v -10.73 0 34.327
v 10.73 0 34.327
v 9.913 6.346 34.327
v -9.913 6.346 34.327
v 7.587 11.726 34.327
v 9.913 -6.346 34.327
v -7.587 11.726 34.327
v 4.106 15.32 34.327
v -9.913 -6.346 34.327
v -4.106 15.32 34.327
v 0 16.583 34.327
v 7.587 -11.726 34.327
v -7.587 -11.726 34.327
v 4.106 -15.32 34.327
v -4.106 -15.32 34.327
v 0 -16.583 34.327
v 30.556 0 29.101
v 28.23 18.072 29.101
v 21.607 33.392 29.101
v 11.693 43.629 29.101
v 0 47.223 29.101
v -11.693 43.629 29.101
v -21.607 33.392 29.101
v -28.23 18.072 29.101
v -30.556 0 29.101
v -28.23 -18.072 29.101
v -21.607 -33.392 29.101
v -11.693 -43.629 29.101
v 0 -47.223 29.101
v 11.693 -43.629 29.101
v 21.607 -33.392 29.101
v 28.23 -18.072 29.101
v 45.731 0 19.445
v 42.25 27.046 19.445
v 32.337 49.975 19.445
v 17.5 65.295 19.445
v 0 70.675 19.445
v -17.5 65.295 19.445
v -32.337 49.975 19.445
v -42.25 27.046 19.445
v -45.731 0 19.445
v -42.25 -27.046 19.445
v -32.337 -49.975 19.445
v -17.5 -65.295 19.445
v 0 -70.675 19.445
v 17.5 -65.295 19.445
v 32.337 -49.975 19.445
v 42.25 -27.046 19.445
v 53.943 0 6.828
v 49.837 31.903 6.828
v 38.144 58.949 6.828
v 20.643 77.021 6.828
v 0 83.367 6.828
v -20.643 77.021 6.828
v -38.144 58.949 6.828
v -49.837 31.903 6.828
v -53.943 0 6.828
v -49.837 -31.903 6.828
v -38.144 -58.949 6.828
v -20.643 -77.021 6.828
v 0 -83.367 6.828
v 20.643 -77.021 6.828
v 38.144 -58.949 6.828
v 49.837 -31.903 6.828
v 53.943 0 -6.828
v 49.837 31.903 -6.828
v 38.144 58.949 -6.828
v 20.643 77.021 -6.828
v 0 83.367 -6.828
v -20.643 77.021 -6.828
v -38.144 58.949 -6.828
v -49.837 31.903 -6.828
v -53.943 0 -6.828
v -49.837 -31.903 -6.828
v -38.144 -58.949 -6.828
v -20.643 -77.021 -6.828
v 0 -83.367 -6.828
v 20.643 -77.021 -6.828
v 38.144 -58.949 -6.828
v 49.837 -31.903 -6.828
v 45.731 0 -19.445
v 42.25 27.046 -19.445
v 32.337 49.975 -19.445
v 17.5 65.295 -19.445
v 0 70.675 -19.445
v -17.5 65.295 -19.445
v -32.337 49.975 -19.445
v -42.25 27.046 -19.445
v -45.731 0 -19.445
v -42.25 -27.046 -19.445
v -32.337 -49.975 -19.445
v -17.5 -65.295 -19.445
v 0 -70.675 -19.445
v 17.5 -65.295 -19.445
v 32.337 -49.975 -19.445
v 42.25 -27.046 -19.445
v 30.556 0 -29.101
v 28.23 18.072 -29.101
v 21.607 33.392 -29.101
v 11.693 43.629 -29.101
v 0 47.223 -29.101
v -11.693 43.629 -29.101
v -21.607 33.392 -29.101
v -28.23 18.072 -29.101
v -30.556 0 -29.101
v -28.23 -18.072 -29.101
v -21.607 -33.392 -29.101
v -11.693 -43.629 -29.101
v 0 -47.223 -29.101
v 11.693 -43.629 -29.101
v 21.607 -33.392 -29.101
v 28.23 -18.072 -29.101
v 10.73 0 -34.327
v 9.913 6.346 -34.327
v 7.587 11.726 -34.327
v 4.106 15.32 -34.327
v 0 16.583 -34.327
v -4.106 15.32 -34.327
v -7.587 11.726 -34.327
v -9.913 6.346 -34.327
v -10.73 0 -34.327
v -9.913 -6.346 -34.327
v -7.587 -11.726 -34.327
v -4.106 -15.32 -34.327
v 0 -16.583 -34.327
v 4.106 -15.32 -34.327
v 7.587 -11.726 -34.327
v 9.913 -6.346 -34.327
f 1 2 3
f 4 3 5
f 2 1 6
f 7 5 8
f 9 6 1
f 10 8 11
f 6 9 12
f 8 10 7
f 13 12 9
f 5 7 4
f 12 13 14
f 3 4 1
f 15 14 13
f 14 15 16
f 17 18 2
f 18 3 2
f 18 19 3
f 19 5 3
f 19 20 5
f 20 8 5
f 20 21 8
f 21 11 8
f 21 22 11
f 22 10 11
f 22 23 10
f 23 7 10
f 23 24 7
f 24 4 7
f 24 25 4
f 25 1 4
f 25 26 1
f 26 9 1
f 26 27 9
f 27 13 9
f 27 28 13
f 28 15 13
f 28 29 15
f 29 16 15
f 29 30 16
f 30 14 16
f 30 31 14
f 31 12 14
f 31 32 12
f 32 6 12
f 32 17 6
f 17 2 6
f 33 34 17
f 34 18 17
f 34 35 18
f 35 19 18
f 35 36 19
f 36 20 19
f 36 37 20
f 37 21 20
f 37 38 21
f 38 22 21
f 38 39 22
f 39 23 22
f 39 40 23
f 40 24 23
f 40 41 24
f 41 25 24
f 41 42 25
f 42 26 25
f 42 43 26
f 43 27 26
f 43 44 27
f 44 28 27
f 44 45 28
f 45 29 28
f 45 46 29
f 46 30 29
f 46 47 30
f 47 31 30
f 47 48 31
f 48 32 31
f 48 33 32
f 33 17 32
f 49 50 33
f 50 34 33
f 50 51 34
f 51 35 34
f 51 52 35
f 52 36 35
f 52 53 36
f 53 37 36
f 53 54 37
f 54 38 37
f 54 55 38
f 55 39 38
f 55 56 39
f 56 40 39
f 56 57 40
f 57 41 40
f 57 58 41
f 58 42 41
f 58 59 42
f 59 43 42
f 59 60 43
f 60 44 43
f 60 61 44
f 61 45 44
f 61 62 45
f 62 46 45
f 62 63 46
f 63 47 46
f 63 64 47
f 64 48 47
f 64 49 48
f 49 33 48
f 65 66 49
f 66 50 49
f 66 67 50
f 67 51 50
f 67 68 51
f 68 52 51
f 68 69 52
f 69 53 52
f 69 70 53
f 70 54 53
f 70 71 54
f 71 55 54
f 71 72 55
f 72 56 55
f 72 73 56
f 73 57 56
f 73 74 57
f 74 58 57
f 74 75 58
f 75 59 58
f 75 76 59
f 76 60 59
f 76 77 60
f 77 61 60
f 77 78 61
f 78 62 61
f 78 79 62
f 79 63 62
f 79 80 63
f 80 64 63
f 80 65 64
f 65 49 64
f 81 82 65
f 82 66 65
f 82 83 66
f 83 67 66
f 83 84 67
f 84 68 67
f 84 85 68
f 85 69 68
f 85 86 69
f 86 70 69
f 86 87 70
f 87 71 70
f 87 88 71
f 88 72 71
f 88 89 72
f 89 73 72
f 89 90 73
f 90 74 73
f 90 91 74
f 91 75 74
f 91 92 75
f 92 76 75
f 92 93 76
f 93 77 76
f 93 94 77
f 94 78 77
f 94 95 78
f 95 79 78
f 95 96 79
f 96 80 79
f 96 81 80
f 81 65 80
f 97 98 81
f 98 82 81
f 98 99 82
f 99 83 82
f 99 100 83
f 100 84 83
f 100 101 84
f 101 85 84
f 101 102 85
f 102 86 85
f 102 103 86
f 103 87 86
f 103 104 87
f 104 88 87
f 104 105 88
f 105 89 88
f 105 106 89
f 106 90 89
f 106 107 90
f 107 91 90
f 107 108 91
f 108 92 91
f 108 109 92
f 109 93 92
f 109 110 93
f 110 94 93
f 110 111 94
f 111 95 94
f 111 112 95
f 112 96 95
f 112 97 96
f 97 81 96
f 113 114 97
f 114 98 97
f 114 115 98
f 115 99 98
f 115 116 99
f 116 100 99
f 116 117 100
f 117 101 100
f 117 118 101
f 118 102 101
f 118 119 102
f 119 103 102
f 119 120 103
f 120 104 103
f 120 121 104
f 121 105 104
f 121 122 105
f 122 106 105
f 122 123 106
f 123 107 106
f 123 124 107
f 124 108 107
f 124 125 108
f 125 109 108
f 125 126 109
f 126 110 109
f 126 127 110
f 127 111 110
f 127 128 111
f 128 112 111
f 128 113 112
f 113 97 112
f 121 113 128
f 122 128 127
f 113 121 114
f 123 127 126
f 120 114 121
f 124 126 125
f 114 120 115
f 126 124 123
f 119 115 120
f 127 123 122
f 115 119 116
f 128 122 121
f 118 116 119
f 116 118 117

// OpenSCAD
// Generated by SolidPython 1.0.1 on 2020-07-29 00:46:50


scale(v = [11, 17, 7]) {
	sphere(r = 5);
}
/***********************************************
*********      SolidPython code:      **********
************************************************
 
# import packages: SolidPython
from solid import *
from solid.utils import *
from itertools import chain, combinations, permutations


class Resize:

    def __init__(self, scad_file):
        self.scad_file = scad_file
        #self.scad_file = import_scad(scad_file)
        # cone/cylinder param:
        self.r1 = 0
        self.r2 = 0
        self.h = 0
        # rectangular prism param:
        self.w = 0
        self.l = 0
        # ellipse param:
        self.r = 0

    # import OpenScad code (file name corresponds to shape)


    # classify shape + parameters
    def assign(self, param1, param2, param3):
        if self.scad_file == 'cone.scad':
            self.r1 = param1
            self.r2 = param2
            self.h = param3
        elif self.scad_file == 'cylinder.scad':
            self.r1 = param1
            self.r2 = param2
            self.h = param3
        elif self.scad_file == 'rectangularPrism.scad':
            self.h = param1
            self.l = param2
            self.w = param3
        else:
            self.r = param1
            self.h = param2

    # resize parameters
    def iterate(self):
        x = range(3, 20, 2)
        i = 1
        if self.scad_file == 'cone.scad':
            tempList = list(permutations(x, 2))
            for temp in tempList:
                param1 = temp[0]
                param2 = temp[1]
                filepath = 'produced_scad_files/' + 'cone' + str(param1) + '_' + str(param2) + '_' + '.scad'
                scad_render_to_file(cylinder(h=param1, r1=param2, r2=0), filepath)

        elif self.scad_file == 'cylinder.scad':
            tempList = list(permutations(x, 3))
            for temp in tempList:
                param1 = temp[0]
                param2 = temp[1]
                filepath = 'produced_scad_files/' + 'cylinder' + str(param1) + '_' + str(param2) + '_' + '.scad'
                scad_render_to_file(cylinder(h=param1, r1=param2, r2=param2), filepath)

        elif self.scad_file == 'rectangularPrism.scad':
            tempList = list(permutations(x, 3))
            for temp in tempList:
                param1 = temp[0]
                param2 = temp[1]
                param3 = temp[2]
                filepath = 'produced_scad_files/' + 'rectangularPrism' + str(param1) + '_' + str(param2) + '_' + str(
                    param3) + '.scad'
                scad_render_to_file(cube(size=(param1, param2, param3)), filepath)

        elif self.scad_file == 'ellipse.scad':
            tempList = list(permutations(x, 4))
            for temp in tempList:
                param1 = temp[0]
                param2 = temp[1]
                param3 = temp[2]
                param4 = temp[3]
                filepath = 'produced_scad_files/' + 'ellipse' + str(param1) + '_' + str(param2) + '_' + str(param3) + '_' + str(param4) + '.scad'
                scad_render_to_file(scale([param1, param2, param3])(sphere(r=param4)), filepath)

    def render_to_scadfile(self):
        scad_render_to_file(scad, 'example.scad') 
 
************************************************/
